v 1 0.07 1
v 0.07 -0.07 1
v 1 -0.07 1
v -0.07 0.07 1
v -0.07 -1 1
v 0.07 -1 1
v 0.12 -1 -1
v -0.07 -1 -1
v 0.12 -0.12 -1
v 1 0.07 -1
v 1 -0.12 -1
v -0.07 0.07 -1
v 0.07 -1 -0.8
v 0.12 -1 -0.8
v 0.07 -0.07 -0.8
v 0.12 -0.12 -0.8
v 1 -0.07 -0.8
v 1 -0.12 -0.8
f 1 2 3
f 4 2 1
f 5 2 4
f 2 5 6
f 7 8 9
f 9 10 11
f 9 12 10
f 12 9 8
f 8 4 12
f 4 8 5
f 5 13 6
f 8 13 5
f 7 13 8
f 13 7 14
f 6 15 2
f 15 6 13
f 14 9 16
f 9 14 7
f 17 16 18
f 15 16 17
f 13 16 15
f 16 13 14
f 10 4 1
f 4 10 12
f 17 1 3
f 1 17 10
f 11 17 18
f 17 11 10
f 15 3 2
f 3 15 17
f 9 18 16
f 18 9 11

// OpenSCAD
module Wall_02(rot = 0){


module Wall_01(){
    translate([-0.06,0,0])
    color("white")
    cube([0.02,1,2], center= true);
    
    color("#295f48")
    translate([0.06,0,0])
    color("white")
    cube([0.02,1,2], center= true);
    
    
    color("#b2b2b2")
    cube([0.1,1,2], center= true);
    
    translate([0.095,0,-0.9])    
    color("gray")
    cube([0.05,1,0.2], center= true);

}

rotate([0,0,rot * 90]){
union(){
translate([0,-0.5,0])
Wall_01();

translate([0.5,0,0])
rotate([0,0,-90])
Wall_01();

}

color("white")
translate([-0.035,0.035,0])
rotate([0,0,0])
cube([0.07,0.07,2], center= true);

}
}


Wall_02(rot = 0);
